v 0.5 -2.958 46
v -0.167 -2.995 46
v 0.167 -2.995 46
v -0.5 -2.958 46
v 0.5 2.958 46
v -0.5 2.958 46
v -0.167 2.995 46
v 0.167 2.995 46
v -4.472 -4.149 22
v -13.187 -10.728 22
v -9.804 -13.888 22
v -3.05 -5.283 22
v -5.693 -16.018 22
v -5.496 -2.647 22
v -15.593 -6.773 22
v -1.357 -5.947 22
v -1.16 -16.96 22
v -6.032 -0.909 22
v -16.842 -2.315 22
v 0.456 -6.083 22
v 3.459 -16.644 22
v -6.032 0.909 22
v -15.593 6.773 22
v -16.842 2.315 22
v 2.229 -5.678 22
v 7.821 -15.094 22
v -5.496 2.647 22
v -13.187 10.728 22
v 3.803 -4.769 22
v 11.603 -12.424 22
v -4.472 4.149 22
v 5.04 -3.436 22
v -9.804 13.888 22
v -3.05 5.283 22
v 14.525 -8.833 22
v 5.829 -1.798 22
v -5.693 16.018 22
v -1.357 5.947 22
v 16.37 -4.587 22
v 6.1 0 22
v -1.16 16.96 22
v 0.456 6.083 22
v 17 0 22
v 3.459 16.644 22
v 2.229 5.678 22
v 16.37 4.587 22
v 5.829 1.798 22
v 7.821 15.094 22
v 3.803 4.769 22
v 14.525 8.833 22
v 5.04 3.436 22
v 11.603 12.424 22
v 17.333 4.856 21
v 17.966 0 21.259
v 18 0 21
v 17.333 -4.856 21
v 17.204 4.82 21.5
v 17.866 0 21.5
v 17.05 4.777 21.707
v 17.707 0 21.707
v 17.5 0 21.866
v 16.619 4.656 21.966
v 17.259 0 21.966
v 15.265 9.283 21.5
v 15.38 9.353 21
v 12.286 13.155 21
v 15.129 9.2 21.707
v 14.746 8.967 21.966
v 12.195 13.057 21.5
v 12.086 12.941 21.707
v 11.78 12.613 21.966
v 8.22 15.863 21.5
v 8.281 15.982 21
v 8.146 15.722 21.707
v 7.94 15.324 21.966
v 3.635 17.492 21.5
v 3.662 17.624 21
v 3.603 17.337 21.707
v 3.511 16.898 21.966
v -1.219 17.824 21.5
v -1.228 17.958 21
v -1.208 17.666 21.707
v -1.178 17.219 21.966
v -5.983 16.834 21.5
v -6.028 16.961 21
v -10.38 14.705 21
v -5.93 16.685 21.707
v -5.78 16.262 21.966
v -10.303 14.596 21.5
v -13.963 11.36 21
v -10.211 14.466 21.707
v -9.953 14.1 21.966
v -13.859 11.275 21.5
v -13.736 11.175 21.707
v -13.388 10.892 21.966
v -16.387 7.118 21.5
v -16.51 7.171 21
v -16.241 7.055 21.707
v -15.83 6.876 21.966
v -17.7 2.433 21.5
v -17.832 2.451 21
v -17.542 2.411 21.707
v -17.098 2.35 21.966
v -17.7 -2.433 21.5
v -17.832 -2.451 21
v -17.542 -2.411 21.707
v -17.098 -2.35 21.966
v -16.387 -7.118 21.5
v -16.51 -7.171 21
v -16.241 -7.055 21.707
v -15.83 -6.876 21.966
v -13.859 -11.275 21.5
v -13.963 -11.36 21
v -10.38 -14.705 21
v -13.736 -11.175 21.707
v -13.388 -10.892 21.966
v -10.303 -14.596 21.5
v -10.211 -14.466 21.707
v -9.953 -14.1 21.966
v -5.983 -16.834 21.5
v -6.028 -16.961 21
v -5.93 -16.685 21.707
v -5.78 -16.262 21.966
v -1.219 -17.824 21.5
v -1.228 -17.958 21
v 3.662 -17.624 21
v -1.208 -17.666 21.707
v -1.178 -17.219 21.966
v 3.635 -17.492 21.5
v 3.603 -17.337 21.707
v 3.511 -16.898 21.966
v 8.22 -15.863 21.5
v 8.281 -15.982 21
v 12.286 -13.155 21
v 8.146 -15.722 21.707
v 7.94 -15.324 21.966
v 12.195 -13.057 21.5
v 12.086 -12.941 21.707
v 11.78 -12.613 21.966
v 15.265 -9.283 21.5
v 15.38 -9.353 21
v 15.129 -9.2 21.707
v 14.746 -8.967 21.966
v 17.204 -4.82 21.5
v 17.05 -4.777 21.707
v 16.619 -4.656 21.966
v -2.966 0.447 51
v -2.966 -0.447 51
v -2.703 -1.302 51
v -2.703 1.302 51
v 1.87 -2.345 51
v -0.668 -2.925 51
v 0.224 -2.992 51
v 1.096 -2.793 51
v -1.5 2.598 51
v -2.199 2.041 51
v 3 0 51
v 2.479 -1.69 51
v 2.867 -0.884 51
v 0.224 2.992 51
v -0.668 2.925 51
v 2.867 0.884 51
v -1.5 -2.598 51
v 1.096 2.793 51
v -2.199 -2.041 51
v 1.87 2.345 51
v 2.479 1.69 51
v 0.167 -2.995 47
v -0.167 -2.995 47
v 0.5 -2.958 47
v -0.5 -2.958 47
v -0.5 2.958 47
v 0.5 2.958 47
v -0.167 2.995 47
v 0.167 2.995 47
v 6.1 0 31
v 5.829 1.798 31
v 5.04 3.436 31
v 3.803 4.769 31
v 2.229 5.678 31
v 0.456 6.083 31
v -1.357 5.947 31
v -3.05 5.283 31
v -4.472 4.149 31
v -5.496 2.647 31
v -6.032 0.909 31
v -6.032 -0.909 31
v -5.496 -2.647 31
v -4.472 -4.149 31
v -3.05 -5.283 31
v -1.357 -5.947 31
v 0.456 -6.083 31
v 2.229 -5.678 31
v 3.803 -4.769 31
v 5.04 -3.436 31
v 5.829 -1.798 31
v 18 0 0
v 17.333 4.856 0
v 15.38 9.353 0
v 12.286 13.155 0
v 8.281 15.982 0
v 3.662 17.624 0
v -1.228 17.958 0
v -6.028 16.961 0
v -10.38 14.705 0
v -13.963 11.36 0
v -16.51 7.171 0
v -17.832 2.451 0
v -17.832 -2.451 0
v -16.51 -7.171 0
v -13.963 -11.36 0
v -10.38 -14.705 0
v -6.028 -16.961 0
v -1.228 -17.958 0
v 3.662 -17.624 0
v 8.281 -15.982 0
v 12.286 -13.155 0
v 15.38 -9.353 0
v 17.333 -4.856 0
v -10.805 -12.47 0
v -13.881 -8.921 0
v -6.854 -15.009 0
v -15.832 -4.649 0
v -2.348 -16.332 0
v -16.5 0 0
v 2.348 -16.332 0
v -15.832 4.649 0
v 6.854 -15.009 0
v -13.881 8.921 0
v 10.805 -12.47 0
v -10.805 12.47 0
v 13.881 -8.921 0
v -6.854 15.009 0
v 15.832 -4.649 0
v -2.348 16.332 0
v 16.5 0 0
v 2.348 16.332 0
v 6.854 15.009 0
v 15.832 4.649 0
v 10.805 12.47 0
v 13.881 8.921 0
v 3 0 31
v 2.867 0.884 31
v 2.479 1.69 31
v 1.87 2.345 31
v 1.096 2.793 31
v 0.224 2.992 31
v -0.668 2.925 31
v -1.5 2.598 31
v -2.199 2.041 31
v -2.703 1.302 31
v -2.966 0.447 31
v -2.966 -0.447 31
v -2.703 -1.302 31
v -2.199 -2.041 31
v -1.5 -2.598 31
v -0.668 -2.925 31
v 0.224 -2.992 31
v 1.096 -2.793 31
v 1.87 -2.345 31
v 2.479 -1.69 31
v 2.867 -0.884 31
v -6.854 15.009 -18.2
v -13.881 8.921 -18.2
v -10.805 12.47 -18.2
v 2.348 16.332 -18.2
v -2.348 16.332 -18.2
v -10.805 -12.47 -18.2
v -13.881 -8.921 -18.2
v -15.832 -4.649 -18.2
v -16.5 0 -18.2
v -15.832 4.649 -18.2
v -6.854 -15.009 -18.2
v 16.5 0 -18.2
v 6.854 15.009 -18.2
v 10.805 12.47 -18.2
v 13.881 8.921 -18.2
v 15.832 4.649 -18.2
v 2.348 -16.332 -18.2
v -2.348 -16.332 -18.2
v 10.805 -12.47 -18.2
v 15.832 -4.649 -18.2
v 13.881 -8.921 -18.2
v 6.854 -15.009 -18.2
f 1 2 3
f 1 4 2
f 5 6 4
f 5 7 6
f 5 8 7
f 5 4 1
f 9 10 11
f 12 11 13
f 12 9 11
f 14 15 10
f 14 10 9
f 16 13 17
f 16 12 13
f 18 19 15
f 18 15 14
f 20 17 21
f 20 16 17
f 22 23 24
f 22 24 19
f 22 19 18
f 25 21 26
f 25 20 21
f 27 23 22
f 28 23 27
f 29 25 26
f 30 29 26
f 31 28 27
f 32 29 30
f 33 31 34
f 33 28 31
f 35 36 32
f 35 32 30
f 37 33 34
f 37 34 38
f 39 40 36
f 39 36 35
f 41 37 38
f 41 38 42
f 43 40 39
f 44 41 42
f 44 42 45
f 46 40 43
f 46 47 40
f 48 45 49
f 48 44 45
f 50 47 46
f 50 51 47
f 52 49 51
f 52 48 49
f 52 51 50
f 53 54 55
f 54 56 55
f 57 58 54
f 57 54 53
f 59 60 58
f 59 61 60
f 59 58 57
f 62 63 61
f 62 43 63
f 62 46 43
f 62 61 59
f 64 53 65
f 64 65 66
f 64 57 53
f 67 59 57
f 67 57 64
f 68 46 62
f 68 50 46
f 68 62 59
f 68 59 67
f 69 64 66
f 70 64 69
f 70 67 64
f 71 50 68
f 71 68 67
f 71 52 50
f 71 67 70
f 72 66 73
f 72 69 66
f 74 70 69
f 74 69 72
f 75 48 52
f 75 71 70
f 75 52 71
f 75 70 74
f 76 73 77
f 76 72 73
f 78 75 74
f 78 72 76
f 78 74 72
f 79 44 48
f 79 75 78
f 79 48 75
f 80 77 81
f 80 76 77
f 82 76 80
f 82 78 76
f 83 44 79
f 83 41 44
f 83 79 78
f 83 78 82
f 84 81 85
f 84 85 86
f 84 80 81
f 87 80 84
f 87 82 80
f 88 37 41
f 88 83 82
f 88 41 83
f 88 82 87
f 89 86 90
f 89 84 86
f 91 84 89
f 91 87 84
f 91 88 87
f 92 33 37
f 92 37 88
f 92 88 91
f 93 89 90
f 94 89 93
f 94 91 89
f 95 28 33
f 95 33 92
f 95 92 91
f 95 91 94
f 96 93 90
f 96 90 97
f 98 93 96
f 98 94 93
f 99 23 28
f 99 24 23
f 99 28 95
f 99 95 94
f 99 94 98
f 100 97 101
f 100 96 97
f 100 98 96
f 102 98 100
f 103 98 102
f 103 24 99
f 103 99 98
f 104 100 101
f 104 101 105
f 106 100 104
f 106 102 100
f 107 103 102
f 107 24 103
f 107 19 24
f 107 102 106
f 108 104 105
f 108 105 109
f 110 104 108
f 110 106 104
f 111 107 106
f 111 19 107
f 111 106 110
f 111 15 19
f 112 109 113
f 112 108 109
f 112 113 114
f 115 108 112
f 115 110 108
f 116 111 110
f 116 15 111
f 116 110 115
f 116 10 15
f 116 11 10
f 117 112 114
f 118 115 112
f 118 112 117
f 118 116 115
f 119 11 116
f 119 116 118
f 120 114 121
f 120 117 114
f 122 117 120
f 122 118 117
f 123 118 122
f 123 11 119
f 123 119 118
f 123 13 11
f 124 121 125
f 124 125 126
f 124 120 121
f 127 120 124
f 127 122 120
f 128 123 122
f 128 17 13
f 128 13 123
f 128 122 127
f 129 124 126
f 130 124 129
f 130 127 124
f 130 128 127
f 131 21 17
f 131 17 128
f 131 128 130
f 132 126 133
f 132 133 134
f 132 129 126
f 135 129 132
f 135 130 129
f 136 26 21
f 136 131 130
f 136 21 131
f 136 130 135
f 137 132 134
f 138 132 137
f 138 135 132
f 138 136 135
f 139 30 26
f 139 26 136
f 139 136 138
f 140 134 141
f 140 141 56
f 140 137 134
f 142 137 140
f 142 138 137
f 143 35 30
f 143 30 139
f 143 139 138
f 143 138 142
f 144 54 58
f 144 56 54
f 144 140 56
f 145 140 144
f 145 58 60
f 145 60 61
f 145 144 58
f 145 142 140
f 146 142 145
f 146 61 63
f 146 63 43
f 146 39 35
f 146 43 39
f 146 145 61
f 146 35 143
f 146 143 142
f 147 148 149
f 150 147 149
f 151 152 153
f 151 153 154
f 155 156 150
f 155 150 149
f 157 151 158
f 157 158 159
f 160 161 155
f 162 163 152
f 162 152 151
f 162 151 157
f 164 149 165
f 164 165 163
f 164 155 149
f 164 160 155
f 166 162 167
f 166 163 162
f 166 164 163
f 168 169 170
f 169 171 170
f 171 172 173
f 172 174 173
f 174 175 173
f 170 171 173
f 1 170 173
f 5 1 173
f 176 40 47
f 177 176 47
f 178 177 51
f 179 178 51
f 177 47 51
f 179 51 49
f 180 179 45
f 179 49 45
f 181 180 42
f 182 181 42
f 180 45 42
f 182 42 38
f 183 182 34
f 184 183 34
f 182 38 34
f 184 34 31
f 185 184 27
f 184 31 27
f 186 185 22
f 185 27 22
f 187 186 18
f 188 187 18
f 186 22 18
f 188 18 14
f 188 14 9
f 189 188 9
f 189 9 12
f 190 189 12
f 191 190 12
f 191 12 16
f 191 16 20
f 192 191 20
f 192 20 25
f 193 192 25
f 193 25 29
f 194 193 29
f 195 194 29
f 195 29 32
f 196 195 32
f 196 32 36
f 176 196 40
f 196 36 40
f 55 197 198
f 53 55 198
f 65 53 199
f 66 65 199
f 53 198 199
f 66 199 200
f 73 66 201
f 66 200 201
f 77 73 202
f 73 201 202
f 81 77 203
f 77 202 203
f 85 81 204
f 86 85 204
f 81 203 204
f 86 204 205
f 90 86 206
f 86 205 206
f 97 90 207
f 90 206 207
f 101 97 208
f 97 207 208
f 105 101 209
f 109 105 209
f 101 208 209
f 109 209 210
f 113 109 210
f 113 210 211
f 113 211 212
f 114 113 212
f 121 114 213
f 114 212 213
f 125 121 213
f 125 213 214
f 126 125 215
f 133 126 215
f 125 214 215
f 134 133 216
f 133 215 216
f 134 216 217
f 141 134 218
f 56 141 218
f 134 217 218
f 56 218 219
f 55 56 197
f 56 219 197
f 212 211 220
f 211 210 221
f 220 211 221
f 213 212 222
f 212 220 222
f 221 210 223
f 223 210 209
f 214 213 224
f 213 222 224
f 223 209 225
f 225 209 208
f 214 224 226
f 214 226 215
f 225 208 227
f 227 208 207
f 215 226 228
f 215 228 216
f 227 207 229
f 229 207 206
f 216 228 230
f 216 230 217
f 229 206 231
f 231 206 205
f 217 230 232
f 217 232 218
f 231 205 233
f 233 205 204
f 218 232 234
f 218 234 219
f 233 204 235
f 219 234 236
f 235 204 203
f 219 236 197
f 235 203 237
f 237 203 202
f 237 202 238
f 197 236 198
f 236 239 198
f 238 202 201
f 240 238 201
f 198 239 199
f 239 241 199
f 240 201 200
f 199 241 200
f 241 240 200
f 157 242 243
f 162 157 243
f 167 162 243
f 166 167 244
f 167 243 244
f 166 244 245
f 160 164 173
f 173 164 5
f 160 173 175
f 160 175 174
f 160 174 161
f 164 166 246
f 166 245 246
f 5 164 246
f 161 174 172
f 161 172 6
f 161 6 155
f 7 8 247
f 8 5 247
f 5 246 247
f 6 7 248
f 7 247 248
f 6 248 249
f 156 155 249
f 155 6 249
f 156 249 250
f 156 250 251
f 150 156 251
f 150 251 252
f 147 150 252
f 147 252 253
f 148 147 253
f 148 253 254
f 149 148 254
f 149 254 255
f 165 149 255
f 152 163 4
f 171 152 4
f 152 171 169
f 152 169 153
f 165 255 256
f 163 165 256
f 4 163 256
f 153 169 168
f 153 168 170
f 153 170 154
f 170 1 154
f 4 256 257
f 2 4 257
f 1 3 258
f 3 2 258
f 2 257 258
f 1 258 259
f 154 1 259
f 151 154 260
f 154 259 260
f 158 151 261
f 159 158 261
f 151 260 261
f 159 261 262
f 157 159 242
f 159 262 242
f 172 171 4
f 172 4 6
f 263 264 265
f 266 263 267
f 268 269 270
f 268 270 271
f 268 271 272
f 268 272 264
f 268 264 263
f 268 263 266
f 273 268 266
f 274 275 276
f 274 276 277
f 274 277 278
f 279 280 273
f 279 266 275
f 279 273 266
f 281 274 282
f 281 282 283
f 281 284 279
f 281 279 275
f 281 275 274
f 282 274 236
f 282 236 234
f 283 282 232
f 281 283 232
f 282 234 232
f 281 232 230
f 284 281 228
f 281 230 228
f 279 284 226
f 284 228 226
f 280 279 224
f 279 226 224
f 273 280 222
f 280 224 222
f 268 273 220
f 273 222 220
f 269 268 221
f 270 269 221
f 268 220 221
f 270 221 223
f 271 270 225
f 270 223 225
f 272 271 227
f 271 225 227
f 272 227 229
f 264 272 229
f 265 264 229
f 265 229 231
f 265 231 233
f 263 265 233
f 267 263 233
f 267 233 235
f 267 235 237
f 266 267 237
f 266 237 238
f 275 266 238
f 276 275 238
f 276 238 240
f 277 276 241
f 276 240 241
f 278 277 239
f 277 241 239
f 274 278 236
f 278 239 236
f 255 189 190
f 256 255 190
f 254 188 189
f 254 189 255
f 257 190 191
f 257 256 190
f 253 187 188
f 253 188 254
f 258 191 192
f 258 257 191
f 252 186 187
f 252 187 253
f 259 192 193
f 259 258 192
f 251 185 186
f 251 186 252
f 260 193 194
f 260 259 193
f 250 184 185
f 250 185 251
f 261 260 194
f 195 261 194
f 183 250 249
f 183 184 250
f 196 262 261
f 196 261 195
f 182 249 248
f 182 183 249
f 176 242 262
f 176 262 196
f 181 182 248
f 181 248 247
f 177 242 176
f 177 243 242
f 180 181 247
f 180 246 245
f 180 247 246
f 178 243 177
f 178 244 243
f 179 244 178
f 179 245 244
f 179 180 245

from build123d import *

# Parameters (mm, degrees)
SKETCH1_R           = 18
BOSS_EXTRUDE1_DEPTH = 22
SKETCH2_R           = 6.1
BOSS_EXTRUDE2_DEPTH = 9
SKETCH3_R           = 3
BOSS_EXTRUDE3_DEPTH = 20
SKETCH4_R           = 16.5
BOSS_EXTRUDE4_DEPTH = 18.2
FILLET1_R           = 1
CUT_EXTRUDE1_START  = -4
SKETCH5_W           = 1
SKETCH5_H           = 9.640702938
CUT_EXTRUDE1_DEPTH  = 1


with BuildPart() as part:
    # Sketch1 → Boss-Extrude1 (new body)
    with BuildSketch(Plane.XY):
        Circle(SKETCH1_R)
    extrude(amount=BOSS_EXTRUDE1_DEPTH)

    # Sketch2 → Boss-Extrude2 (add)
    with BuildSketch(Plane.XY.offset(22)):
        Circle(SKETCH2_R)
    extrude(amount=BOSS_EXTRUDE2_DEPTH)

    # Sketch3 → Boss-Extrude3 (add)
    with BuildSketch(Plane.XY.offset(31)):
        Circle(SKETCH3_R)
    extrude(amount=BOSS_EXTRUDE3_DEPTH)

    # Sketch4 → Boss-Extrude4 (add)
    with BuildSketch(Plane(origin=(0, 0, 0), x_dir=(-1, 0, 0), z_dir=(0, 0, -1))):
        with Locations(Location((0, 0, 0), (0, 0, 180))):
            Circle(SKETCH4_R)
    extrude(amount=BOSS_EXTRUDE4_DEPTH)

    # Fillet1
    fillet1_edges = [part.edges().sort_by_distance(p)[0] for p in [
        (-18, 0, 22),
    ]]
    fillet(fillet1_edges, radius=FILLET1_R)

    # Sketch5 → Cut-Extrude1 (cut)
    with BuildSketch(Plane.XY.offset(51).offset(CUT_EXTRUDE1_START)):
        Rectangle(SKETCH5_W, SKETCH5_H)
    extrude(amount=-CUT_EXTRUDE1_DEPTH, mode=Mode.SUBTRACT)


solid = part.part
